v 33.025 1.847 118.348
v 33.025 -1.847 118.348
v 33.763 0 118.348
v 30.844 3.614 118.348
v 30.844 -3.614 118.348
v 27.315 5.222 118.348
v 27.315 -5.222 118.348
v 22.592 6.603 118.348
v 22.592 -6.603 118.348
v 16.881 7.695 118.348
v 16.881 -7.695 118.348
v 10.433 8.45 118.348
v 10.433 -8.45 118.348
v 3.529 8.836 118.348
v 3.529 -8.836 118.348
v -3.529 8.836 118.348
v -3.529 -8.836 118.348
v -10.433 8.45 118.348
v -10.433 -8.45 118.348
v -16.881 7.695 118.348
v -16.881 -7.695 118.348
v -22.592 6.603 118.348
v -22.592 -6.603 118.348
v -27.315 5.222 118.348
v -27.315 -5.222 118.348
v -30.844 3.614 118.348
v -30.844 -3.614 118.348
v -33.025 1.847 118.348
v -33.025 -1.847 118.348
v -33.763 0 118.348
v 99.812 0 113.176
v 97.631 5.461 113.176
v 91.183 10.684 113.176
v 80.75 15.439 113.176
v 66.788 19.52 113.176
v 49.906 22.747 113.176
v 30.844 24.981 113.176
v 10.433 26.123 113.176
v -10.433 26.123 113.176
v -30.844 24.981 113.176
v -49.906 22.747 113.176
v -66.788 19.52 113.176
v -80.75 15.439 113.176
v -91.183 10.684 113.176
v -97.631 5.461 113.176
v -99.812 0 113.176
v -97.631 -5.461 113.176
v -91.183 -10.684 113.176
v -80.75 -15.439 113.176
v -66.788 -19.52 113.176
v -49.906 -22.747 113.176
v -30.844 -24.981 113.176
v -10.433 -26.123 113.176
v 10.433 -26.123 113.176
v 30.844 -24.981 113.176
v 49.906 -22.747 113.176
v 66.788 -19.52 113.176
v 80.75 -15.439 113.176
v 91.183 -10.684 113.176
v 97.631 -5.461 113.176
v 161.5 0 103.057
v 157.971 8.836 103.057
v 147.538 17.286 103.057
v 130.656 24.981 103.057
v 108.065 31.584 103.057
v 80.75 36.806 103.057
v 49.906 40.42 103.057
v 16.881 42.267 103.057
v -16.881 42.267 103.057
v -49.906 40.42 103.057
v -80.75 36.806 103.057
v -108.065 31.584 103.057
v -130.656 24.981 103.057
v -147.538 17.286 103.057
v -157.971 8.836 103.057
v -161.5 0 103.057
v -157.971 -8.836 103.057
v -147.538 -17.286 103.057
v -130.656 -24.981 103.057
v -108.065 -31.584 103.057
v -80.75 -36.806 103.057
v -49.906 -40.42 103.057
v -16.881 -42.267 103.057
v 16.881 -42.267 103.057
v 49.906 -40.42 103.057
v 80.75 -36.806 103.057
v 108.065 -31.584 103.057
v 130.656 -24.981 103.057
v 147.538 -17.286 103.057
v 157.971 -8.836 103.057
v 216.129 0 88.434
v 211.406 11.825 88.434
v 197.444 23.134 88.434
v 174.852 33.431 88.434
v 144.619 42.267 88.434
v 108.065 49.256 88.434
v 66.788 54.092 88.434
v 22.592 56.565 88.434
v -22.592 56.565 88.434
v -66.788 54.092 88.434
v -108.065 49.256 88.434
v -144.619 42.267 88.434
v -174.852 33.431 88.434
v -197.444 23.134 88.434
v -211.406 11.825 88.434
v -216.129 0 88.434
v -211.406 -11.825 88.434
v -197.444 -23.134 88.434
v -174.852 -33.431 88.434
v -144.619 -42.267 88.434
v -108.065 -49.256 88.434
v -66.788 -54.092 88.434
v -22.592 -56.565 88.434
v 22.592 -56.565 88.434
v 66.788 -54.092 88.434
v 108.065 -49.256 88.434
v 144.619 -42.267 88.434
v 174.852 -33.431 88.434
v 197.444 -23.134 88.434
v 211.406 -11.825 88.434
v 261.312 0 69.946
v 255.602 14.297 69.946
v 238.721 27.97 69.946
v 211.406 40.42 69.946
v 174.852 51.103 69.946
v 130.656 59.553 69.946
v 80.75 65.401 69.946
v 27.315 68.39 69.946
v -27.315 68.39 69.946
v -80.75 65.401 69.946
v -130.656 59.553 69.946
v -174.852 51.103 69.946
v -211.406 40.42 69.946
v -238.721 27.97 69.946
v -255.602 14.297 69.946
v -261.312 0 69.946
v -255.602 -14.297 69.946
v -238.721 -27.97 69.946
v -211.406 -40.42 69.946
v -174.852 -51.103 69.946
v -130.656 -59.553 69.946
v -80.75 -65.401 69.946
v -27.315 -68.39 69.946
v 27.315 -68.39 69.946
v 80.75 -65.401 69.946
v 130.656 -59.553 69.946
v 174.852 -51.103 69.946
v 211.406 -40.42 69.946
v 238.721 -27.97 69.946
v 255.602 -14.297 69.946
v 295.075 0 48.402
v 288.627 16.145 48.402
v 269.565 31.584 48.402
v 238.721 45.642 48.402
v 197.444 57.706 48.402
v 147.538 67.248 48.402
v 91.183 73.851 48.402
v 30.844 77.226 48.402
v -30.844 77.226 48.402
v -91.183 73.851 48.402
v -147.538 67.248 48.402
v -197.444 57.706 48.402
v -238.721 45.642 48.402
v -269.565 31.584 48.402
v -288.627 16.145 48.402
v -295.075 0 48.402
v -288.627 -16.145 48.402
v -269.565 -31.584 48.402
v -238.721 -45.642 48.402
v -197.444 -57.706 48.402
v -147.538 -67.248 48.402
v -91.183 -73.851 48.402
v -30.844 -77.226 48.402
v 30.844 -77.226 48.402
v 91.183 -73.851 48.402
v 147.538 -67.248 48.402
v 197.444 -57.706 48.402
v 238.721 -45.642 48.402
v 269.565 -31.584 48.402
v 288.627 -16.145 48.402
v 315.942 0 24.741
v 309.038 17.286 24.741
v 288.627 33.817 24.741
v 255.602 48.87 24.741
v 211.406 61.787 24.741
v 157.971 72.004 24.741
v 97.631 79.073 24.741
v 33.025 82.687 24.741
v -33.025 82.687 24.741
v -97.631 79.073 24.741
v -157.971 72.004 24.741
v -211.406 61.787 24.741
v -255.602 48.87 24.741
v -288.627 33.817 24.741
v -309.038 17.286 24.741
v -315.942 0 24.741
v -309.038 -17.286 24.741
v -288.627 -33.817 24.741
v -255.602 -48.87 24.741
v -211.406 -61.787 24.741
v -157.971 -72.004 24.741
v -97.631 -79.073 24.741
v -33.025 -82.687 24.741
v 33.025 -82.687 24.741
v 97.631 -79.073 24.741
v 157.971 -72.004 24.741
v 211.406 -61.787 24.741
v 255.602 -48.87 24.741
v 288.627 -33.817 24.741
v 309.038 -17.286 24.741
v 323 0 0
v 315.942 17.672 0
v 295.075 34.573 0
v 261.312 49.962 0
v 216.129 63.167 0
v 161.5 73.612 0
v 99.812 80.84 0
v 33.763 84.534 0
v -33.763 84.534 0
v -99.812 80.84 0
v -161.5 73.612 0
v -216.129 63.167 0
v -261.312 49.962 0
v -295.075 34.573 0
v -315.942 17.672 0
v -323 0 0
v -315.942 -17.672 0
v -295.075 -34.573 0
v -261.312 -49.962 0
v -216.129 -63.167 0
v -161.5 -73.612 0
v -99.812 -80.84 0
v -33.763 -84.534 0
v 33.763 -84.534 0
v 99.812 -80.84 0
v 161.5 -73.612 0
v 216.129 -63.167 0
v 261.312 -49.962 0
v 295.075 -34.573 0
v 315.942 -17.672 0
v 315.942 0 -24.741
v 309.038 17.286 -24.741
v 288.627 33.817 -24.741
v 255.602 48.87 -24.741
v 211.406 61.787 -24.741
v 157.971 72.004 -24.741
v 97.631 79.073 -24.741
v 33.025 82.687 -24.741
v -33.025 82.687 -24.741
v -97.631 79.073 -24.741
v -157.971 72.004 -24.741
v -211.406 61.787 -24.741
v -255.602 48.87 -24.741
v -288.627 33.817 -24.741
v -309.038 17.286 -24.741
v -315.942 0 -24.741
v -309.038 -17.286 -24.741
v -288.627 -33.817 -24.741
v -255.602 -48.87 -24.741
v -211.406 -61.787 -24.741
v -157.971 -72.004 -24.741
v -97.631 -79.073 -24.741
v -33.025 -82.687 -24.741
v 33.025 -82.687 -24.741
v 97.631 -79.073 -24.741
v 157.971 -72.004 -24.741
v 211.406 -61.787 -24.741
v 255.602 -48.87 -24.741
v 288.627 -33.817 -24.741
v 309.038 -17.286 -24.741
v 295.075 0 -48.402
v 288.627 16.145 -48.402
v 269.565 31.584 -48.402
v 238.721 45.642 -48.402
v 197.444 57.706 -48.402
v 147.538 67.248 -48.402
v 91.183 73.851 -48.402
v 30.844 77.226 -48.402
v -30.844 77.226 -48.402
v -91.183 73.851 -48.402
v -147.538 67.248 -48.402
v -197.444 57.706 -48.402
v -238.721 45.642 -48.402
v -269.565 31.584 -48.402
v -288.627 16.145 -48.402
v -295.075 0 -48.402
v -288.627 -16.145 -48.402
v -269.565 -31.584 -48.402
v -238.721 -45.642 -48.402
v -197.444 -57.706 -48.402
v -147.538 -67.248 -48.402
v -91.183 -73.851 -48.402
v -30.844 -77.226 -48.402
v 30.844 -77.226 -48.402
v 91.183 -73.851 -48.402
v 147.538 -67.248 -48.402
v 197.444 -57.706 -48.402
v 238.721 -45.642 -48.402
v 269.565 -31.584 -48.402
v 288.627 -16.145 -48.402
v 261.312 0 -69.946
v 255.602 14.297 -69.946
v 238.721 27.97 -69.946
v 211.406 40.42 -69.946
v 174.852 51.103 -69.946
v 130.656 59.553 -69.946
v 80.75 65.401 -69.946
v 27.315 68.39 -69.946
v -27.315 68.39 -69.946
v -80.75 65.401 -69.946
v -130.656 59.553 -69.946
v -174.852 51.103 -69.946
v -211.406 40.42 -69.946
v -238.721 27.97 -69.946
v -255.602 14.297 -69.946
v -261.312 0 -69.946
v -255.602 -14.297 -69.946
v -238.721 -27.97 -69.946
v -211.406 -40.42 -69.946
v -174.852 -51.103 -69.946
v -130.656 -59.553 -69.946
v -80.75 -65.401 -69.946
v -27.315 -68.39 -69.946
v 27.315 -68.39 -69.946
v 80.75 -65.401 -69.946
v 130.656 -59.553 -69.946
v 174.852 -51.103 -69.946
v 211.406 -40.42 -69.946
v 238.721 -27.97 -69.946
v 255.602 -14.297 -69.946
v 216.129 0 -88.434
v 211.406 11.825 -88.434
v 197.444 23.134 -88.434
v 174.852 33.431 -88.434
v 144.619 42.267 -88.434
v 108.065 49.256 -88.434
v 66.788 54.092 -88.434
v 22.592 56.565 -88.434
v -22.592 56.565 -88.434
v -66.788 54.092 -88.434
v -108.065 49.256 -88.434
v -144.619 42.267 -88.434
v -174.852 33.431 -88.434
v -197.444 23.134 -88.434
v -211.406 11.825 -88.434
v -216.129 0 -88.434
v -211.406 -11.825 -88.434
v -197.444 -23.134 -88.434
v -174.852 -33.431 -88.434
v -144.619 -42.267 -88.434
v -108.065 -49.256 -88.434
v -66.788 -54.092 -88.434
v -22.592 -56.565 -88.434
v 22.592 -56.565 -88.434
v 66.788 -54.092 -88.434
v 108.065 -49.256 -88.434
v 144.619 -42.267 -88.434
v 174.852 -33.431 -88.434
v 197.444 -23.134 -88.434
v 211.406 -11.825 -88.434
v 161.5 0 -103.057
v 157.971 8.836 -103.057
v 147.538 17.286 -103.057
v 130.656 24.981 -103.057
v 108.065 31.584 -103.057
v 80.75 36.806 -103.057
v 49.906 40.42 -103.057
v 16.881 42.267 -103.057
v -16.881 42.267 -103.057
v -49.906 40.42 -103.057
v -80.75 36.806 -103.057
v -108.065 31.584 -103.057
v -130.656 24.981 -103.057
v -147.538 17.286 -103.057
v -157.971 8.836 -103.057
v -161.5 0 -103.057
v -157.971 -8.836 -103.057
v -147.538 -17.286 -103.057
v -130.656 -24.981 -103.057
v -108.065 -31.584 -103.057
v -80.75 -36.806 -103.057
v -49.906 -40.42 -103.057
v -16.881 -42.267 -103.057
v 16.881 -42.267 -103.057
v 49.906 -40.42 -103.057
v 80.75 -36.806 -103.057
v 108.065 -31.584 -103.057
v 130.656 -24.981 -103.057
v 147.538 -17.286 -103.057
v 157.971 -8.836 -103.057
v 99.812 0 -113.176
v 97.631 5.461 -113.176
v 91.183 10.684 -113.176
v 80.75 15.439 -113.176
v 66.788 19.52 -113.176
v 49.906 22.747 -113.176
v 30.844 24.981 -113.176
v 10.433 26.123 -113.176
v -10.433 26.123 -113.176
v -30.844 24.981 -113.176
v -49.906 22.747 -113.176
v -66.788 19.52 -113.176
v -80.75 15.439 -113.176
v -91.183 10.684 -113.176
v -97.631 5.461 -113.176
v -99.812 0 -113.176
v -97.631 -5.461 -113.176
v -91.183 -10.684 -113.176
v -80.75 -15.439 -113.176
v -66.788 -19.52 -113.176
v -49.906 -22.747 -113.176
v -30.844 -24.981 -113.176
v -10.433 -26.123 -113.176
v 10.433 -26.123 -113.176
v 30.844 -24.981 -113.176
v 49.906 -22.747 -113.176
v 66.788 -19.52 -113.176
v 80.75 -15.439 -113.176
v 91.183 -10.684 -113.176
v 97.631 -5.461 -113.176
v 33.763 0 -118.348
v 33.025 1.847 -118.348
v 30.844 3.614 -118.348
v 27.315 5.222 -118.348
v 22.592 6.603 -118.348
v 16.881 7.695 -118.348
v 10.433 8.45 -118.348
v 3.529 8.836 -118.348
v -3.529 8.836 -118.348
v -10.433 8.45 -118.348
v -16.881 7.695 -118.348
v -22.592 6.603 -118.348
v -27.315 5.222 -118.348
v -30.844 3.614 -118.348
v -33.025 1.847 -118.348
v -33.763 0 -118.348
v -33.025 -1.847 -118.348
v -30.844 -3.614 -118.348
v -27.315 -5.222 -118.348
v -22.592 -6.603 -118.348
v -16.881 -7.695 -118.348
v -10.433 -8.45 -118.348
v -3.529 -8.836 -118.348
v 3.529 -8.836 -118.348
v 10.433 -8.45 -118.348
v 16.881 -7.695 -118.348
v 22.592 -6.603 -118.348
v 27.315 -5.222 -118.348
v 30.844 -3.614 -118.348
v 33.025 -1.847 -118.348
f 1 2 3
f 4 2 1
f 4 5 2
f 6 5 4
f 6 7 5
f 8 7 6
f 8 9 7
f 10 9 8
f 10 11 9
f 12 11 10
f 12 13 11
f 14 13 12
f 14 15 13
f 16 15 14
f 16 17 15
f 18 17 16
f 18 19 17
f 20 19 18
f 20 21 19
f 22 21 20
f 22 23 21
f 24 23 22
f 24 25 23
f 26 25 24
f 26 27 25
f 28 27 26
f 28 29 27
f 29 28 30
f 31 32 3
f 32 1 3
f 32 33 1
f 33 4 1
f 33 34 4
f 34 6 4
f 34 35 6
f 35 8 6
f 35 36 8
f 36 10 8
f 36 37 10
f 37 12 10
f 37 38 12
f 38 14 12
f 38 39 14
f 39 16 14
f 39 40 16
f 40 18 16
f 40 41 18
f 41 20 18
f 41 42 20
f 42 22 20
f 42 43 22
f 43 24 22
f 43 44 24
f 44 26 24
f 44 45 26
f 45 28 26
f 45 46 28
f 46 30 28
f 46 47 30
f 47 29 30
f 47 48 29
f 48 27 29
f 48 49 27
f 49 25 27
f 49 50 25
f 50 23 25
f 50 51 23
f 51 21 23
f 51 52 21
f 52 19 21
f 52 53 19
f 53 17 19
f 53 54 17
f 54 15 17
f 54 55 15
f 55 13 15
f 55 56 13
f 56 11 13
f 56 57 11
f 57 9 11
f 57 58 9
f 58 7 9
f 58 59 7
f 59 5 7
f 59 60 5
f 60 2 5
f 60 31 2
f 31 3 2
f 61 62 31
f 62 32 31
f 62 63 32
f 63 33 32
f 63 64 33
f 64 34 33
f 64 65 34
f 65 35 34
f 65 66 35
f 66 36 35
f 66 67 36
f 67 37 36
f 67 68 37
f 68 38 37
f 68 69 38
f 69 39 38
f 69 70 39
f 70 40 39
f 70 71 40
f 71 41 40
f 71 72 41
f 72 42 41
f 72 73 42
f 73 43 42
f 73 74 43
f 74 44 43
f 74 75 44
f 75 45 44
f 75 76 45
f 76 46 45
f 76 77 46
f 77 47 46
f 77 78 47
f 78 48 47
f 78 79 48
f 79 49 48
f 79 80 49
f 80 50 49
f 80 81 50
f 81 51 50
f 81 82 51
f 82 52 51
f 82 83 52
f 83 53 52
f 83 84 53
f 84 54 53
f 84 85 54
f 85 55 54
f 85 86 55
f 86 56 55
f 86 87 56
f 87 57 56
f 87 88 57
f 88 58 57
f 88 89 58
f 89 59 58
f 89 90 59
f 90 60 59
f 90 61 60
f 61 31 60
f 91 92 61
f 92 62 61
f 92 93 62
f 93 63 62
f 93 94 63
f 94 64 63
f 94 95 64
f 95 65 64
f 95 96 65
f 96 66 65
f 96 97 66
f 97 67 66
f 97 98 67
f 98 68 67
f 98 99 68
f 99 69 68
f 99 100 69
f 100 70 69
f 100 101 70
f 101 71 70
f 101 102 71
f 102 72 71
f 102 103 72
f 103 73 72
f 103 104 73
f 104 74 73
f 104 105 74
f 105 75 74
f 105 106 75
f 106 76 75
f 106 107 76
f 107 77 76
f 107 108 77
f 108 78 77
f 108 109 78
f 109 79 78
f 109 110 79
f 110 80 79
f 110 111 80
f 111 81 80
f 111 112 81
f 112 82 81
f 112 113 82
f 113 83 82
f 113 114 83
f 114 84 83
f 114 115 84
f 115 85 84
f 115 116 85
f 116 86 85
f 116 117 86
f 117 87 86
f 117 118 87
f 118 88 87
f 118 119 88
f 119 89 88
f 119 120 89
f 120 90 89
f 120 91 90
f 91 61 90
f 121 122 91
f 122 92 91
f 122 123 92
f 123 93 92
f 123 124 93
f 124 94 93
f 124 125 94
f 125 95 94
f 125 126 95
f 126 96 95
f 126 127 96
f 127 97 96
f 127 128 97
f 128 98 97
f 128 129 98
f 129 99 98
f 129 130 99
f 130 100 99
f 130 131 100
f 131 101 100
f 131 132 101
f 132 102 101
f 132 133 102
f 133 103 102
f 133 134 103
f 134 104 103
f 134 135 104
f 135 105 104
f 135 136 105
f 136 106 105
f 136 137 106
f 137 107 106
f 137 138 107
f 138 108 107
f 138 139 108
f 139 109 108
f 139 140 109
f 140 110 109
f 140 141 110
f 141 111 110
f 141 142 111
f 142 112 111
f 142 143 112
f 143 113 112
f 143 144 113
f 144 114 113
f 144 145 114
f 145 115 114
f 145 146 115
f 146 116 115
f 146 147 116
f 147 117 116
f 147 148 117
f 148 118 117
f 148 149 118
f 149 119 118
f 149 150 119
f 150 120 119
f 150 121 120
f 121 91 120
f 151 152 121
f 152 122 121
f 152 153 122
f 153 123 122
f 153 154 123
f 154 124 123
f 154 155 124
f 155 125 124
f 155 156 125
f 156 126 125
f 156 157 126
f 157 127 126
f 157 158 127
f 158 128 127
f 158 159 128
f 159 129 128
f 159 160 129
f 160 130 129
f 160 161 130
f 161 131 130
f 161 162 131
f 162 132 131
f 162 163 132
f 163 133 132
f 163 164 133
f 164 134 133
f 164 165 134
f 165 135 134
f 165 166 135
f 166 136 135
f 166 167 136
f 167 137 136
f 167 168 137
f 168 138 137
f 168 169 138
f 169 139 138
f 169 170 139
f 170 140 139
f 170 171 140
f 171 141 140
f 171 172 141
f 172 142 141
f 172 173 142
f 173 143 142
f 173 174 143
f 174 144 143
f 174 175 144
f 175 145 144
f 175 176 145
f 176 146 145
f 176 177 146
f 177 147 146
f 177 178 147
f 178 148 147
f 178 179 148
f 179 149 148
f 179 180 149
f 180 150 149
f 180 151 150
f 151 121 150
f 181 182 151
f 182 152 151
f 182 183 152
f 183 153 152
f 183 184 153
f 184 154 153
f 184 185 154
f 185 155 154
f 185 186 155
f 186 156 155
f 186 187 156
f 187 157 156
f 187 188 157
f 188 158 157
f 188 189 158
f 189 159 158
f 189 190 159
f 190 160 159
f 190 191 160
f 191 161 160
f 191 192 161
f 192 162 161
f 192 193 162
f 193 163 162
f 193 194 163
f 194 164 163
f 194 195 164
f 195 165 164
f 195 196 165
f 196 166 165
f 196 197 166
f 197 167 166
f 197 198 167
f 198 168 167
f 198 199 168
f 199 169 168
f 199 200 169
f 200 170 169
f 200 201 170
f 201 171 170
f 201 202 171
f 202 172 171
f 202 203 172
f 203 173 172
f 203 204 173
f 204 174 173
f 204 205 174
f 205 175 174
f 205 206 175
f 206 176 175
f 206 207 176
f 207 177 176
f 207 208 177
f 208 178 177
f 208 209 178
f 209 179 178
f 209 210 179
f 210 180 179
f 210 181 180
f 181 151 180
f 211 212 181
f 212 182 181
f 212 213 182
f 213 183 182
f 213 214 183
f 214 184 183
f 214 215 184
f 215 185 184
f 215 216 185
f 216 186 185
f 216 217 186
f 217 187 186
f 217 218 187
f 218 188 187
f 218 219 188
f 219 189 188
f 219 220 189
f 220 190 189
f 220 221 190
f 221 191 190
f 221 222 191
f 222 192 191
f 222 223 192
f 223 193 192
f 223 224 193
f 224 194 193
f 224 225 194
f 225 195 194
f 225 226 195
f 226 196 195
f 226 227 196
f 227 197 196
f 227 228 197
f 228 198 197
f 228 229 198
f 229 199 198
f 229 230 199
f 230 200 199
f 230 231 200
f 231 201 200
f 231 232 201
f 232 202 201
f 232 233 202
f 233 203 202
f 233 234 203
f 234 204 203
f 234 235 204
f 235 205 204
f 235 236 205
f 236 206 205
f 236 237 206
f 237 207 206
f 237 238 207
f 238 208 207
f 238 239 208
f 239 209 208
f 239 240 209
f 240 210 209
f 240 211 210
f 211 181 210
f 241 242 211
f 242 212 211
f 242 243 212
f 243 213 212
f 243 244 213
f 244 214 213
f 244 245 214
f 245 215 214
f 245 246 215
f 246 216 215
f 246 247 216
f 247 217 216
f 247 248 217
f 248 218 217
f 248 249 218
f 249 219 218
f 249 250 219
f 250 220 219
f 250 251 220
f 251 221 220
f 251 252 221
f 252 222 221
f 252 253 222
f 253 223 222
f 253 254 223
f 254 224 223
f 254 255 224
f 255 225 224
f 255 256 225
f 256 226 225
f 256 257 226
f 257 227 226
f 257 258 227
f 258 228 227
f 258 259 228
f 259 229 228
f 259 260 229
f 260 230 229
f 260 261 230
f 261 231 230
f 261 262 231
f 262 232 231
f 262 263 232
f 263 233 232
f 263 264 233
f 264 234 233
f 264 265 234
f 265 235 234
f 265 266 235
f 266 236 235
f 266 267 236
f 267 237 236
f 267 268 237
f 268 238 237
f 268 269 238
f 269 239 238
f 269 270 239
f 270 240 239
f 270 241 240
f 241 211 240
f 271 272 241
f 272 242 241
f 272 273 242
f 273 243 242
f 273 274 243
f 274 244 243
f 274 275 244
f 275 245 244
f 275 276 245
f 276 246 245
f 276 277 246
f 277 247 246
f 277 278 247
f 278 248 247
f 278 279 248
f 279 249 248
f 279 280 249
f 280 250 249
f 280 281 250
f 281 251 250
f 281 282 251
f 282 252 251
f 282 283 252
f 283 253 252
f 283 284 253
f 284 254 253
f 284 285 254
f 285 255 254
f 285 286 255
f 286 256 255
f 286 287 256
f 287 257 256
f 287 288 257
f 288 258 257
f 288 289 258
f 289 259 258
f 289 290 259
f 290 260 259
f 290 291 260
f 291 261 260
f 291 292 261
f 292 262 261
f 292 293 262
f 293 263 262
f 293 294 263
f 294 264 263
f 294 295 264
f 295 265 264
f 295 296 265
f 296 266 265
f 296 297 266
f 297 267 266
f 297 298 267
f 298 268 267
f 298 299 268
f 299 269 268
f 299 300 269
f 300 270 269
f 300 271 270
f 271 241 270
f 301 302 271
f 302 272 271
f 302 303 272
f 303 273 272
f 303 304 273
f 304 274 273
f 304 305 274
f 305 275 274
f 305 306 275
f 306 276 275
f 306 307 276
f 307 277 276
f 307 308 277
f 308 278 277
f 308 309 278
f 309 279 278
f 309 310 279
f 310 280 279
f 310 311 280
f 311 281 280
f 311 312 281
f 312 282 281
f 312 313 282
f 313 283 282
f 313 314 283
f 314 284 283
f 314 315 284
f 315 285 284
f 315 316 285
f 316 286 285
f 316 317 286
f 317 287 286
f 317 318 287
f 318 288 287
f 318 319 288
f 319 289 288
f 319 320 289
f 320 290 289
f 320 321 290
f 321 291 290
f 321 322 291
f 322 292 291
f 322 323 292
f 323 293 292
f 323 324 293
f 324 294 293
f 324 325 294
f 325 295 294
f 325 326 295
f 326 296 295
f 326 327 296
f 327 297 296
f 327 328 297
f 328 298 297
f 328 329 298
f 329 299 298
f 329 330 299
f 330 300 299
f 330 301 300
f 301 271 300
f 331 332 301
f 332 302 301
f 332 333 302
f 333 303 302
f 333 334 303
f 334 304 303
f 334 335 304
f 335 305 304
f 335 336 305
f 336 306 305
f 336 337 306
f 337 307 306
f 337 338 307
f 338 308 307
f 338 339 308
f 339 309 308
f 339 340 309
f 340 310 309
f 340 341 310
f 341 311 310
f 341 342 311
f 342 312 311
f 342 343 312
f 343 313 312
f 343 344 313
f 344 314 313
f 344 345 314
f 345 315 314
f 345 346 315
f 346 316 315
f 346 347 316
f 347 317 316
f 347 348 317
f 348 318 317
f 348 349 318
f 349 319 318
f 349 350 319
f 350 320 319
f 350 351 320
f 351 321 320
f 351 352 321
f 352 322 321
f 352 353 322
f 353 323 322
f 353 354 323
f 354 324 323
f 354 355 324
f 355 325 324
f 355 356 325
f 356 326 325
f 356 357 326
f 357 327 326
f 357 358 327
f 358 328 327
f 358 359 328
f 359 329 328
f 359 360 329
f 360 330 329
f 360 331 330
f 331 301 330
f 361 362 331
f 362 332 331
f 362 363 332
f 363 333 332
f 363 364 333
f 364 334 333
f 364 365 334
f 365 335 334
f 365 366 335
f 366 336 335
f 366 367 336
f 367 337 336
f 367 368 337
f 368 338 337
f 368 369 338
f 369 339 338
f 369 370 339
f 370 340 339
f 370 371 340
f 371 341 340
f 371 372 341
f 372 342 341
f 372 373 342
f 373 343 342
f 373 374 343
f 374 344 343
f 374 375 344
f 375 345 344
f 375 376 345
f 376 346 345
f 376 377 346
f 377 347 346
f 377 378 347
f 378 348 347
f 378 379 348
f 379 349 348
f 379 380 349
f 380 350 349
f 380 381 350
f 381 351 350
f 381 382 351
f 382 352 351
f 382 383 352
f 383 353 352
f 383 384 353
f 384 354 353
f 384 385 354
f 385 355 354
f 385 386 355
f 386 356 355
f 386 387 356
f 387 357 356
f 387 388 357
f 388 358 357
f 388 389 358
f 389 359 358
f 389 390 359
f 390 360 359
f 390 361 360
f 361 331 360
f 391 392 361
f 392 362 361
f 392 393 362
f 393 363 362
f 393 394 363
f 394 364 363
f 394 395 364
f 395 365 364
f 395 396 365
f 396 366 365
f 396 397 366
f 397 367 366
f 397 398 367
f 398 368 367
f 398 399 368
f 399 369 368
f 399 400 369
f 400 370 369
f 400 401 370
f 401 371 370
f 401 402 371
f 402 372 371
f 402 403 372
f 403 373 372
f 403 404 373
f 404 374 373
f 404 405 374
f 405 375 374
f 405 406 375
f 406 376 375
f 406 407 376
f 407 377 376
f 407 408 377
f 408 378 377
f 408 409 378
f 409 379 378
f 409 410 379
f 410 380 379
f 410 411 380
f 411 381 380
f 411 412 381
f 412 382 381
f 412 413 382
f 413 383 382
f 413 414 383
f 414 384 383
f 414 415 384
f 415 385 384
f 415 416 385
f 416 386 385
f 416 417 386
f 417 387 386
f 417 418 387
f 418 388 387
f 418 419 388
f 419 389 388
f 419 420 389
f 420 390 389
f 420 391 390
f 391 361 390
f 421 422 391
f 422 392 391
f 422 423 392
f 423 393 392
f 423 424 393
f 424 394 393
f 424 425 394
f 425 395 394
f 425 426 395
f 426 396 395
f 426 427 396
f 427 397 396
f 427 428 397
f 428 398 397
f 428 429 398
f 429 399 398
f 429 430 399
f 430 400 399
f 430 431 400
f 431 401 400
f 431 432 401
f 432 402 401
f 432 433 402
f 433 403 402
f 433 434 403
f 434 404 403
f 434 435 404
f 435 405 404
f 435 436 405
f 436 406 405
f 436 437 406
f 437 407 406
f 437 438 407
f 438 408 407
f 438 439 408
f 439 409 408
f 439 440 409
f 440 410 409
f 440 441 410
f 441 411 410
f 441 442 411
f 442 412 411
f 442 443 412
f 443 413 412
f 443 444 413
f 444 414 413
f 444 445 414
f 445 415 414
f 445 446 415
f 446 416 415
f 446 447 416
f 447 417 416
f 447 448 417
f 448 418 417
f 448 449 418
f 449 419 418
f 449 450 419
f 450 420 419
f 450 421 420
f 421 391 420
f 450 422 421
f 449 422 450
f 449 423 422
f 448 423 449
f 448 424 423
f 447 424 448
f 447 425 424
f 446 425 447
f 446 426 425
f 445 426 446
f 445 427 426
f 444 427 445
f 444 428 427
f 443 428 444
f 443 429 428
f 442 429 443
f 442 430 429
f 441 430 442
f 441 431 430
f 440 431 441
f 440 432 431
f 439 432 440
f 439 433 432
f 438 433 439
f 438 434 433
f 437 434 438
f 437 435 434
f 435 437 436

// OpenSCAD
// Generated by SolidPython 1.0.1 on 2020-07-29 00:46:53


scale(v = [19, 5, 7]) {
	sphere(r = 17);
}
/***********************************************
*********      SolidPython code:      **********
************************************************
 
# import packages: SolidPython
from solid import *
from solid.utils import *
from itertools import chain, combinations, permutations


class Resize:

    def __init__(self, scad_file):
        self.scad_file = scad_file
        #self.scad_file = import_scad(scad_file)
        # cone/cylinder param:
        self.r1 = 0
        self.r2 = 0
        self.h = 0
        # rectangular prism param:
        self.w = 0
        self.l = 0
        # ellipse param:
        self.r = 0

    # import OpenScad code (file name corresponds to shape)


    # classify shape + parameters
    def assign(self, param1, param2, param3):
        if self.scad_file == 'cone.scad':
            self.r1 = param1
            self.r2 = param2
            self.h = param3
        elif self.scad_file == 'cylinder.scad':
            self.r1 = param1
            self.r2 = param2
            self.h = param3
        elif self.scad_file == 'rectangularPrism.scad':
            self.h = param1
            self.l = param2
            self.w = param3
        else:
            self.r = param1
            self.h = param2

    # resize parameters
    def iterate(self):
        x = range(3, 20, 2)
        i = 1
        if self.scad_file == 'cone.scad':
            tempList = list(permutations(x, 2))
            for temp in tempList:
                param1 = temp[0]
                param2 = temp[1]
                filepath = 'produced_scad_files/' + 'cone' + str(param1) + '_' + str(param2) + '_' + '.scad'
                scad_render_to_file(cylinder(h=param1, r1=param2, r2=0), filepath)

        elif self.scad_file == 'cylinder.scad':
            tempList = list(permutations(x, 3))
            for temp in tempList:
                param1 = temp[0]
                param2 = temp[1]
                filepath = 'produced_scad_files/' + 'cylinder' + str(param1) + '_' + str(param2) + '_' + '.scad'
                scad_render_to_file(cylinder(h=param1, r1=param2, r2=param2), filepath)

        elif self.scad_file == 'rectangularPrism.scad':
            tempList = list(permutations(x, 3))
            for temp in tempList:
                param1 = temp[0]
                param2 = temp[1]
                param3 = temp[2]
                filepath = 'produced_scad_files/' + 'rectangularPrism' + str(param1) + '_' + str(param2) + '_' + str(
                    param3) + '.scad'
                scad_render_to_file(cube(size=(param1, param2, param3)), filepath)

        elif self.scad_file == 'ellipse.scad':
            tempList = list(permutations(x, 4))
            for temp in tempList:
                param1 = temp[0]
                param2 = temp[1]
                param3 = temp[2]
                param4 = temp[3]
                filepath = 'produced_scad_files/' + 'ellipse' + str(param1) + '_' + str(param2) + '_' + str(param3) + '_' + str(param4) + '.scad'
                scad_render_to_file(scale([param1, param2, param3])(sphere(r=param4)), filepath)

    def render_to_scadfile(self):
        scad_render_to_file(scad, 'example.scad') 
 
************************************************/
